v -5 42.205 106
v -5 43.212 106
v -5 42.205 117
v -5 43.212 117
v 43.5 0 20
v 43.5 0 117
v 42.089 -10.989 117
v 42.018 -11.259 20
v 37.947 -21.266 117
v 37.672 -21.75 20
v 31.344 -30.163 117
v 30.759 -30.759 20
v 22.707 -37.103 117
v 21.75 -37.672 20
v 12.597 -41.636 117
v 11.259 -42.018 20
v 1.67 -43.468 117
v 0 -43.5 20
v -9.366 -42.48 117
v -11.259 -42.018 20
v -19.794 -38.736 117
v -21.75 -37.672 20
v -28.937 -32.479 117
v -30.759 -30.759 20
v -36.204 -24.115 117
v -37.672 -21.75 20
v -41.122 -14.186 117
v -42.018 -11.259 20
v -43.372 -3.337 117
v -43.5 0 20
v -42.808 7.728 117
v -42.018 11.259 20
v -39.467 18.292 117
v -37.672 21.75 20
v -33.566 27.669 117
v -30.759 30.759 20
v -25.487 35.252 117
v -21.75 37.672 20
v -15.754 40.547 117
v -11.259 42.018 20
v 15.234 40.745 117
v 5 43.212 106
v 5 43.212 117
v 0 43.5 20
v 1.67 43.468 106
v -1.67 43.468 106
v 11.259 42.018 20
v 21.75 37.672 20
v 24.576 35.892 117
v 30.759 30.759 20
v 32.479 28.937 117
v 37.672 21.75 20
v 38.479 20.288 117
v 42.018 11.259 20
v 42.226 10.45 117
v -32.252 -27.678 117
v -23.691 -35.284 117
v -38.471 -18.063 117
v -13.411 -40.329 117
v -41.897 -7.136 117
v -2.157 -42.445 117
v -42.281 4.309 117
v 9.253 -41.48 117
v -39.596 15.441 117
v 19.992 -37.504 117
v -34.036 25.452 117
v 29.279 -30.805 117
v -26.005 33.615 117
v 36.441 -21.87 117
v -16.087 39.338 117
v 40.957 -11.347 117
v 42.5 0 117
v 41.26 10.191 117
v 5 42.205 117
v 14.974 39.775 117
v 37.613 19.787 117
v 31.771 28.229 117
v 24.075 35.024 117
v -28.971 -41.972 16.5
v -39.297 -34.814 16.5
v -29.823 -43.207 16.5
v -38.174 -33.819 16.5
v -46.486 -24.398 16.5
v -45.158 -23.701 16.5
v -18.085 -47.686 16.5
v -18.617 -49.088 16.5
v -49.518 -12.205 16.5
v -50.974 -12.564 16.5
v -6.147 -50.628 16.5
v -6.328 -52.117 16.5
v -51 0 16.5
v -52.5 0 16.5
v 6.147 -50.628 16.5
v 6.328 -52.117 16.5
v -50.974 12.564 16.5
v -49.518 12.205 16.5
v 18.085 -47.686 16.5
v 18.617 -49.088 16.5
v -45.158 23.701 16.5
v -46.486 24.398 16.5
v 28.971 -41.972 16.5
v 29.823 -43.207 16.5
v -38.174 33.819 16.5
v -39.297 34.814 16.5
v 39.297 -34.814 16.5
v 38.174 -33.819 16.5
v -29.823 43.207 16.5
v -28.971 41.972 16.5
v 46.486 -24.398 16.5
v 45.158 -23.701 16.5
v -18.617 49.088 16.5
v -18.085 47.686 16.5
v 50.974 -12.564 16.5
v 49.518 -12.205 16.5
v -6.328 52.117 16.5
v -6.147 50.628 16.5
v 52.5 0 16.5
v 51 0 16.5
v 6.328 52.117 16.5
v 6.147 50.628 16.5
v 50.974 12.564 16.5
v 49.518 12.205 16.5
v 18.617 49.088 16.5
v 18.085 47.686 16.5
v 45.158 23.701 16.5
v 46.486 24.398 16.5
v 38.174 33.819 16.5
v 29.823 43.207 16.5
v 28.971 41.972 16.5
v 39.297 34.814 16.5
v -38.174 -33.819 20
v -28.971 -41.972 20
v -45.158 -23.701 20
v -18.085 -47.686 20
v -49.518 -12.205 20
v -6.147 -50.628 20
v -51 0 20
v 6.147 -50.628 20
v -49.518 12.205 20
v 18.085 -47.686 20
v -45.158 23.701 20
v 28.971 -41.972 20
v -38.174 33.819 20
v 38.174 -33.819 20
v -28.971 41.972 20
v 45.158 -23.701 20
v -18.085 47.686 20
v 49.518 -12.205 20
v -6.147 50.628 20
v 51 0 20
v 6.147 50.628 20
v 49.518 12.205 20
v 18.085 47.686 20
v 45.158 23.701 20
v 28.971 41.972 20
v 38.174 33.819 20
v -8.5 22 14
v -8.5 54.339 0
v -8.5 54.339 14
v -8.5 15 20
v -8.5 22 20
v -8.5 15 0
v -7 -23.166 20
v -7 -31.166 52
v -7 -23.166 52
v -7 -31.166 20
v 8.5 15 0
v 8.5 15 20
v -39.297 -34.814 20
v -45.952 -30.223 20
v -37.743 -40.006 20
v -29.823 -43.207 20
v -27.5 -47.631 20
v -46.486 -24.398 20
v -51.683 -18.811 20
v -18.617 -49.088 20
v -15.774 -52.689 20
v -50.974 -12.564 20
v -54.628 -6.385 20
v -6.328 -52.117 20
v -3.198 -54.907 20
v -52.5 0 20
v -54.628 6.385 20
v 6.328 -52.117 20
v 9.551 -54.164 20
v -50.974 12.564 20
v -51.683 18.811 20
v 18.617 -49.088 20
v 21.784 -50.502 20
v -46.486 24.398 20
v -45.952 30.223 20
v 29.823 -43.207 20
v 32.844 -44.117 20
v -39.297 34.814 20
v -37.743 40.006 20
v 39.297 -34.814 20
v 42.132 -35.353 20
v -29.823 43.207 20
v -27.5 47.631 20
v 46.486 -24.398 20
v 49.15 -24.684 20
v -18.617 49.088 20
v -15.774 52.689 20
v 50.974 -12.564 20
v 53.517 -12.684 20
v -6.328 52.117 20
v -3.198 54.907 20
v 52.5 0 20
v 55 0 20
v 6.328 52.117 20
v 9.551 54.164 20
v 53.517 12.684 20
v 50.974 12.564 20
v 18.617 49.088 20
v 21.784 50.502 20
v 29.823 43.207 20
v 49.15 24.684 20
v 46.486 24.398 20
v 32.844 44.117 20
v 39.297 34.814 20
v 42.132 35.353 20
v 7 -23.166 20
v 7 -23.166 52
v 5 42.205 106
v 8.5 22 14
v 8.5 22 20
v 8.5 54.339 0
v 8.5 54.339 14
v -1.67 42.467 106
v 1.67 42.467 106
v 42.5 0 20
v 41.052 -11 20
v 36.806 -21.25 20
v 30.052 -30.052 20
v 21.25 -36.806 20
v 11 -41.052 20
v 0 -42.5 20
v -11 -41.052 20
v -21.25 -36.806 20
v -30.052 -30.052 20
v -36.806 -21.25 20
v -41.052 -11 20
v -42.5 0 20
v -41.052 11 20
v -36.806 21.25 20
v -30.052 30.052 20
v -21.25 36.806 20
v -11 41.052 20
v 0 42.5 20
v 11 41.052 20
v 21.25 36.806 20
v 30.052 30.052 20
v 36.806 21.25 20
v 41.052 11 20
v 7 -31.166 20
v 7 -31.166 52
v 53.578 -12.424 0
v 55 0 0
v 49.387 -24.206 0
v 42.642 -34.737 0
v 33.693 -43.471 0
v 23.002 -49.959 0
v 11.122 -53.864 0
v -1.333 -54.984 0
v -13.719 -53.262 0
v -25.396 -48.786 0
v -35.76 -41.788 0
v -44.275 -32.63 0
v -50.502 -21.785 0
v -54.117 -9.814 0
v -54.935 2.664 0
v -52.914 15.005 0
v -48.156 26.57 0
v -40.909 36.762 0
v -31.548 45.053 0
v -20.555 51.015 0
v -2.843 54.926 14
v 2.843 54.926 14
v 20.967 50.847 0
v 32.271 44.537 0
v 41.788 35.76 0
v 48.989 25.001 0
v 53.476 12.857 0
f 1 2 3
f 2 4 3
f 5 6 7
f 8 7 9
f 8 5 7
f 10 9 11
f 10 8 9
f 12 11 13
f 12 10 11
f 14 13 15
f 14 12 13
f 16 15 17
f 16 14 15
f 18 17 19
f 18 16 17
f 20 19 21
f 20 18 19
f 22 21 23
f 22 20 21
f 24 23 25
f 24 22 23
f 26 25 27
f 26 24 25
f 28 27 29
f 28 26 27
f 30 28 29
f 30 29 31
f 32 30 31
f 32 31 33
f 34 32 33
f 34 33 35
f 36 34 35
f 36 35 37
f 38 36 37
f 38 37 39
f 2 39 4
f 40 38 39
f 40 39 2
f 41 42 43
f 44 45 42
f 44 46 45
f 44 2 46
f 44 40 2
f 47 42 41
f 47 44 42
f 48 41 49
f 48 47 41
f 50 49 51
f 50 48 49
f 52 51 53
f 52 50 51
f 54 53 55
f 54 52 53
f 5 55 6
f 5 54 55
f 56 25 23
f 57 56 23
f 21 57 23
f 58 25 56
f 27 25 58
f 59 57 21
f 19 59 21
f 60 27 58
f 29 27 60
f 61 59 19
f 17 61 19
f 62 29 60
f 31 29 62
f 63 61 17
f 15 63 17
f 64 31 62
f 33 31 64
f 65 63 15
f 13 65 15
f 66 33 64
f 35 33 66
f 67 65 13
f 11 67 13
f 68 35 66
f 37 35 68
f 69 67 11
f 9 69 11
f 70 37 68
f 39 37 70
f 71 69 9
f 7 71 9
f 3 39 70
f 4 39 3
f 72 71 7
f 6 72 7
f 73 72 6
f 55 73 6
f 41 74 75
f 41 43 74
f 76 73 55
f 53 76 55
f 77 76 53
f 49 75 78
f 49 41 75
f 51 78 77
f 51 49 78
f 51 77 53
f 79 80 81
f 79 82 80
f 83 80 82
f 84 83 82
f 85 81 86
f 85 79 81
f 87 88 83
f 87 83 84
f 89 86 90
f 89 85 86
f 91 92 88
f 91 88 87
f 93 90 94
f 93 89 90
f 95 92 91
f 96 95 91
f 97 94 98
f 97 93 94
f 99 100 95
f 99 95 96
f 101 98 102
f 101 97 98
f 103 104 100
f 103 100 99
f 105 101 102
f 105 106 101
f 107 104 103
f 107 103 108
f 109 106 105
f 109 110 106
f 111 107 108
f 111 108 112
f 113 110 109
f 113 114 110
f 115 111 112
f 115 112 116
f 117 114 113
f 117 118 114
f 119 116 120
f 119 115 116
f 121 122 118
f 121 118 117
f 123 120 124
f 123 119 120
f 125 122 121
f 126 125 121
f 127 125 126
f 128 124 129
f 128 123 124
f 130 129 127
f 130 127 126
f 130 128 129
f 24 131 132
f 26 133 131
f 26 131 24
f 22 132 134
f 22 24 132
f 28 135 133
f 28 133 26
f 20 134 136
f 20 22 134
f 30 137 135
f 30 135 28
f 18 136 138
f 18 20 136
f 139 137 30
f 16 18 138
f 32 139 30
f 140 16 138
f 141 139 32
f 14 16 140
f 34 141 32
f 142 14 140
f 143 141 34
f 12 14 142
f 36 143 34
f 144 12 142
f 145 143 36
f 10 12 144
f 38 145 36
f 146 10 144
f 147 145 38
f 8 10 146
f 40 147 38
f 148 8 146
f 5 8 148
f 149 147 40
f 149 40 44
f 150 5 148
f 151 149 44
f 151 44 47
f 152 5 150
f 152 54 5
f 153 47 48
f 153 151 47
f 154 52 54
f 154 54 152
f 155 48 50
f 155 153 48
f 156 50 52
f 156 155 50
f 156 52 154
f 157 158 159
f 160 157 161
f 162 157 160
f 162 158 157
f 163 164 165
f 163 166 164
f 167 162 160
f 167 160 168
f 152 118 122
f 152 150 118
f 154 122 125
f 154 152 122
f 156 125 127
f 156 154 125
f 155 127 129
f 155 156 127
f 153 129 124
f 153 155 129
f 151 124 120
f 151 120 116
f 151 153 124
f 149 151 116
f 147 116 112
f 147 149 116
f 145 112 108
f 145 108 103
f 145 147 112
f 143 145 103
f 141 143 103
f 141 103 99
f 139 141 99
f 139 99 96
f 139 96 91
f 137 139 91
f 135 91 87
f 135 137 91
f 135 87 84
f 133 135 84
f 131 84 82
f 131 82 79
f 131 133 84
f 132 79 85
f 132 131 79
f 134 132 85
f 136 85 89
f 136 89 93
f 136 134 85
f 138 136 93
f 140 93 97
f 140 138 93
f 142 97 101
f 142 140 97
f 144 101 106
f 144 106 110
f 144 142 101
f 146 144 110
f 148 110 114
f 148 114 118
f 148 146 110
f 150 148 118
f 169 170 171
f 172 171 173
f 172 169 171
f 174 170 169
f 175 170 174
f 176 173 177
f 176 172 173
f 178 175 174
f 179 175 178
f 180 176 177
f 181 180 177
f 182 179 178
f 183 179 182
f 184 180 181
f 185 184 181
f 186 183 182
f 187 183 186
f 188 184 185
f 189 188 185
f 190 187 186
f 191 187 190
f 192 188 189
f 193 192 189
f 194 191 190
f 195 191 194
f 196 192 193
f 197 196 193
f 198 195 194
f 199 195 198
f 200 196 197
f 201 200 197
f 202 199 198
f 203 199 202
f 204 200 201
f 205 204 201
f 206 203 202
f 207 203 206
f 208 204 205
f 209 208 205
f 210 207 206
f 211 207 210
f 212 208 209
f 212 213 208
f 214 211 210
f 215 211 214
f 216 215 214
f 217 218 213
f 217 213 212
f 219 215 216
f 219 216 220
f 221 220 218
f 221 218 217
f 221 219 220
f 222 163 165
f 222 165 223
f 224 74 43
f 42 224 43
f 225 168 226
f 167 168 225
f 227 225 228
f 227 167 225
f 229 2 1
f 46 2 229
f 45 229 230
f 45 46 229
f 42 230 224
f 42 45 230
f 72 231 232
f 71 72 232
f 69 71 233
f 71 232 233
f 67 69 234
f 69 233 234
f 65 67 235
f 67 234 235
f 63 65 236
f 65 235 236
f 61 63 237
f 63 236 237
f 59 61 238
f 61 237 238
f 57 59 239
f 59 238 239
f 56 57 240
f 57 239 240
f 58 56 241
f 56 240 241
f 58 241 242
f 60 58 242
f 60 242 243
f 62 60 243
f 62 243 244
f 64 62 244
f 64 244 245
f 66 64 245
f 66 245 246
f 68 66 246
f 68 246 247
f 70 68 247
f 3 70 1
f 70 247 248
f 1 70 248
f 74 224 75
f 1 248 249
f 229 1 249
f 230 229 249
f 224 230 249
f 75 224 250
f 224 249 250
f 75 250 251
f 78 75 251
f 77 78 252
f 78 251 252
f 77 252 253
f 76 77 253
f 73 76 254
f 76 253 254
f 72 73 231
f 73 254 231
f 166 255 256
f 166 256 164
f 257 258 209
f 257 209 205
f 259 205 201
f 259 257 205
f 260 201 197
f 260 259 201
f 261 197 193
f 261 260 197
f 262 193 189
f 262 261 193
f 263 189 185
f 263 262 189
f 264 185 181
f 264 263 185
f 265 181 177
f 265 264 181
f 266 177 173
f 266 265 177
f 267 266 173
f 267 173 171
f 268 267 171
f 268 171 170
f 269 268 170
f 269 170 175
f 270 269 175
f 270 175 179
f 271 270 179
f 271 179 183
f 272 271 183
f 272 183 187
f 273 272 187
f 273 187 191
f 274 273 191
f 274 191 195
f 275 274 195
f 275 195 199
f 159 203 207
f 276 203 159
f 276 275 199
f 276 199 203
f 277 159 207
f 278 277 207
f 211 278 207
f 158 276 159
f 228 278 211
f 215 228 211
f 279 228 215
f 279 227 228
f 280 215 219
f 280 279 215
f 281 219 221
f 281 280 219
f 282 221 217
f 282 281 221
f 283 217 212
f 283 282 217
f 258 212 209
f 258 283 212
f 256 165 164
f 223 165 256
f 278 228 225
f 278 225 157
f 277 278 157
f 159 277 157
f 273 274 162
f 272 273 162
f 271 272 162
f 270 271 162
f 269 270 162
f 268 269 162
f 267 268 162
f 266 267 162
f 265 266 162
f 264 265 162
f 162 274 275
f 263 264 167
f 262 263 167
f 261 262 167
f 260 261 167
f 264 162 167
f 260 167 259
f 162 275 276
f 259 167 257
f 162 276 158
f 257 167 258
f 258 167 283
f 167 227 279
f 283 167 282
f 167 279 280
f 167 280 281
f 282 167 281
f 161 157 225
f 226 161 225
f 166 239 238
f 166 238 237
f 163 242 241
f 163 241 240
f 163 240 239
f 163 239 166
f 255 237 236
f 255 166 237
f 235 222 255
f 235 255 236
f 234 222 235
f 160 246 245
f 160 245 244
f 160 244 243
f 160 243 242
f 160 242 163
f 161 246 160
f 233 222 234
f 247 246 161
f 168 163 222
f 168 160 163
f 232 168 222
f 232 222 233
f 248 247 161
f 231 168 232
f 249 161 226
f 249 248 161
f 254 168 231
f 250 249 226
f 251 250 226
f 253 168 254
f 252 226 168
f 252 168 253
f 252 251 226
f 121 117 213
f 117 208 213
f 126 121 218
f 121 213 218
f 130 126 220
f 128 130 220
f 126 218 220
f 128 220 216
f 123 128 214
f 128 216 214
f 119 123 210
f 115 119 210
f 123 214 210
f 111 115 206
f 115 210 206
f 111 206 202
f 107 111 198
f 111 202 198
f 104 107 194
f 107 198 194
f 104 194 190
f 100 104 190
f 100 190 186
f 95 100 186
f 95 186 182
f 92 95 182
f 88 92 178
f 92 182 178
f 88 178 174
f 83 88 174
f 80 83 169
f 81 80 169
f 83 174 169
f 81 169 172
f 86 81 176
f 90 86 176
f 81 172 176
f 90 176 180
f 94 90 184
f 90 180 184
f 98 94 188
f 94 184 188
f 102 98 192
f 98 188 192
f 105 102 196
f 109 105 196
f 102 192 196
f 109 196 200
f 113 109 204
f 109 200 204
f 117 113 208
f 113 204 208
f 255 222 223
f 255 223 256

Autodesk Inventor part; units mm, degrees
ref_plane "YZ Plane" through (0, 0, 0) normal (1, 0, 0) x (0, 1, 0)
ref_plane "XZ Plane" through (0, 0, 0) normal (0, 1, 0) x (-1, 0, 0)
ref_plane "XY Plane" through (0, 0, 0) normal (0, 0, 1) x (1, 0, 0)
sketch "Náčrt1" plane through (0, 0, 0) normal (0, 0, 1) x (1, 0, 0)
  line L0 (0, 77) -> (0, -77) projected
  line L1 (-77, 0) -> (77, 0) projected
  circle A0 centre (0, 0) radius 55
  dimension "d0" = 110
extrude "Vysunutí1" add sketch "Náčrt1" along normal blind 20
sketch "Náčrt3" plane through (0, 0, 20) normal (0, 0, 1) x (1, 0, 0)
  circle A0 centre (0, 0) radius 52.5
  circle A1 centre (0, 0) radius 51
  dimension "d7" = 105
  dimension "d8" = 102
extrude "Vysunutí3" cut sketch "Náčrt3" against normal blind 3.5
sketch "Náčrt4" plane through (0, 0, 0) normal (0, 0, -1) x (-1, 0, 0)
  line L0 (-8.5, 55) -> (8.5, 55)
  line L1 (8.5, 55) -> (8.5, 15)
  line L2 (8.5, 15) -> (-8.5, 15)
  line L3 (-8.5, 15) -> (-8.5, 55)
  line L4 (0, -77) -> (0, 77) projected
  line L5 (-77, 0) -> (77, 0) projected
  circle A0 centre (0, 0) radius 55 projected
  point P0 (0, 55)
  dimension "d11" = 17
  dimension "d12" = 40
extrude "Vysunutí4" cut sketch "Náčrt4" against normal blind 14 contours L0 A0 L3 | A0 L1 L2 L4 | L0 L1 A0 | L4 L2 L3 A0
sketch "Náčrt5" plane through (0, 0, 14) normal (0, 0, -1) x (-1, 0, 0)
  arc A0 (8.5, 54.3392) -> (-8.5, 54.3392) centre (0, 0) ccw projected
  line L0 (-8.5, 15) -> (-8.5, 54.3392) projected
  line L1 (8.5, 15) -> (-8.5, 15) projected
  line L2 (8.5, 54.3392) -> (8.5, 15) projected
  line L3 (-8.5, 15) -> (8.5, 15)
  line L4 (8.5, 15) -> (8.5, 22)
  line L5 (8.5, 22) -> (-8.5, 22)
  line L6 (-8.5, 22) -> (-8.5, 15)
  point P0 (-8.5, 22)
  dimension "d15" = 7
extrude "Vysunutí5" cut sketch "Náčrt5" against normal through all contours L2 L1 L0 L5
sketch "Náčrt6" plane through (0, 0, 20) normal (0, 0, 1) x (1, 0, 0)
  circle A0 centre (0, 0) radius 43.5
  circle A1 centre (0, 0) radius 42.5
  line L0 (8.5, 15) -> (-8.5, 15) projected
  line L1 (-8.5, 15) -> (-8.5, 22) projected
  line L2 (-8.5, 22) -> (8.5, 22) projected
  line L3 (8.5, 22) -> (8.5, 15) projected
  circle A2 centre (0, 0) radius 51 projected
  line L4 (0, 77) -> (0, -77) projected
  dimension "d18" = 87
  dimension "d19" = 85
extrude "Vysunutí6" add sketch "Náčrt6" along normal blind 97 contours A0 L4 A1 | L4 A1 A0
sketch "Náčrt7" plane through (0, 0, 117) normal (0, 0, 1) x (1, 0, 0)
  line L0 (5, 43.5) -> (-5, 43.5)
  line L1 (-5, 43.5) -> (-5, 33.5)
  line L2 (-5, 33.5) -> (5, 33.5)
  line L3 (5, 33.5) -> (5, 43.5)
  circle A0 centre (0, 0) radius 43.5 projected
  line L4 (0, 77) -> (0, -77) projected
  point P0 (0, 43.5)
  dimension "d22" = 10
  dimension "d23" = 10
extrude "Vysunutí7" cut sketch "Náčrt7" against normal blind 11 contours L3 A0 L0 | A0 L1 L0 | L4 L2 L1 A0 | A0 L3 L2 L4 picked at (-2.7791, 36.7906) picked at (2.7791, 36.7906)
sketch "Náčrt8" plane through (0, 0, 20) normal (0, 0, 1) x (1, 0, 0)
  line L0 (7, -31.1663) -> (-7, -31.1663)
  line L1 (-7, -31.1663) -> (-7, -23.1663)
  line L2 (-7, -23.1663) -> (7, -23.1663)
  line L3 (7, -23.1663) -> (7, -31.1663)
  line L4 (0, 77) -> (0, -77) projected
  line L5 (-77, 0) -> (77, 0) projected
  line L6 (16.5, -39.1663) -> (-16.5, -39.1663)
  line L7 (-16.5, -39.1663) -> (-16.5, -31.1663)
  line L8 (-16.5, -31.1663) -> (16.5, -31.1663)
  line L9 (16.5, -31.1663) -> (16.5, -39.1663)
  arc A0 (-5, 42.2049) -> (5, 42.2049) centre (0, 0) ccw projected
  point P0 (0, -39.1663)
  point P1 (0, -31.1663)
  point P2 (0, -42.5)
  point P3 (-42.5, 0)
  point P4 (0, -23.1663)
  point P5 (42.5, 0)
  point P6 (7, -31.1663)
  dimension "d26" = 33
  dimension "d27" = 8
  dimension "d28" = 14
  dimension "d29" = 8
extrude "Vysunutí8" add sketch "Náčrt8" along normal blind 32 contours L0 L4 L2 L3 | L0 L1 L2 L4
properties part number "krabička"
